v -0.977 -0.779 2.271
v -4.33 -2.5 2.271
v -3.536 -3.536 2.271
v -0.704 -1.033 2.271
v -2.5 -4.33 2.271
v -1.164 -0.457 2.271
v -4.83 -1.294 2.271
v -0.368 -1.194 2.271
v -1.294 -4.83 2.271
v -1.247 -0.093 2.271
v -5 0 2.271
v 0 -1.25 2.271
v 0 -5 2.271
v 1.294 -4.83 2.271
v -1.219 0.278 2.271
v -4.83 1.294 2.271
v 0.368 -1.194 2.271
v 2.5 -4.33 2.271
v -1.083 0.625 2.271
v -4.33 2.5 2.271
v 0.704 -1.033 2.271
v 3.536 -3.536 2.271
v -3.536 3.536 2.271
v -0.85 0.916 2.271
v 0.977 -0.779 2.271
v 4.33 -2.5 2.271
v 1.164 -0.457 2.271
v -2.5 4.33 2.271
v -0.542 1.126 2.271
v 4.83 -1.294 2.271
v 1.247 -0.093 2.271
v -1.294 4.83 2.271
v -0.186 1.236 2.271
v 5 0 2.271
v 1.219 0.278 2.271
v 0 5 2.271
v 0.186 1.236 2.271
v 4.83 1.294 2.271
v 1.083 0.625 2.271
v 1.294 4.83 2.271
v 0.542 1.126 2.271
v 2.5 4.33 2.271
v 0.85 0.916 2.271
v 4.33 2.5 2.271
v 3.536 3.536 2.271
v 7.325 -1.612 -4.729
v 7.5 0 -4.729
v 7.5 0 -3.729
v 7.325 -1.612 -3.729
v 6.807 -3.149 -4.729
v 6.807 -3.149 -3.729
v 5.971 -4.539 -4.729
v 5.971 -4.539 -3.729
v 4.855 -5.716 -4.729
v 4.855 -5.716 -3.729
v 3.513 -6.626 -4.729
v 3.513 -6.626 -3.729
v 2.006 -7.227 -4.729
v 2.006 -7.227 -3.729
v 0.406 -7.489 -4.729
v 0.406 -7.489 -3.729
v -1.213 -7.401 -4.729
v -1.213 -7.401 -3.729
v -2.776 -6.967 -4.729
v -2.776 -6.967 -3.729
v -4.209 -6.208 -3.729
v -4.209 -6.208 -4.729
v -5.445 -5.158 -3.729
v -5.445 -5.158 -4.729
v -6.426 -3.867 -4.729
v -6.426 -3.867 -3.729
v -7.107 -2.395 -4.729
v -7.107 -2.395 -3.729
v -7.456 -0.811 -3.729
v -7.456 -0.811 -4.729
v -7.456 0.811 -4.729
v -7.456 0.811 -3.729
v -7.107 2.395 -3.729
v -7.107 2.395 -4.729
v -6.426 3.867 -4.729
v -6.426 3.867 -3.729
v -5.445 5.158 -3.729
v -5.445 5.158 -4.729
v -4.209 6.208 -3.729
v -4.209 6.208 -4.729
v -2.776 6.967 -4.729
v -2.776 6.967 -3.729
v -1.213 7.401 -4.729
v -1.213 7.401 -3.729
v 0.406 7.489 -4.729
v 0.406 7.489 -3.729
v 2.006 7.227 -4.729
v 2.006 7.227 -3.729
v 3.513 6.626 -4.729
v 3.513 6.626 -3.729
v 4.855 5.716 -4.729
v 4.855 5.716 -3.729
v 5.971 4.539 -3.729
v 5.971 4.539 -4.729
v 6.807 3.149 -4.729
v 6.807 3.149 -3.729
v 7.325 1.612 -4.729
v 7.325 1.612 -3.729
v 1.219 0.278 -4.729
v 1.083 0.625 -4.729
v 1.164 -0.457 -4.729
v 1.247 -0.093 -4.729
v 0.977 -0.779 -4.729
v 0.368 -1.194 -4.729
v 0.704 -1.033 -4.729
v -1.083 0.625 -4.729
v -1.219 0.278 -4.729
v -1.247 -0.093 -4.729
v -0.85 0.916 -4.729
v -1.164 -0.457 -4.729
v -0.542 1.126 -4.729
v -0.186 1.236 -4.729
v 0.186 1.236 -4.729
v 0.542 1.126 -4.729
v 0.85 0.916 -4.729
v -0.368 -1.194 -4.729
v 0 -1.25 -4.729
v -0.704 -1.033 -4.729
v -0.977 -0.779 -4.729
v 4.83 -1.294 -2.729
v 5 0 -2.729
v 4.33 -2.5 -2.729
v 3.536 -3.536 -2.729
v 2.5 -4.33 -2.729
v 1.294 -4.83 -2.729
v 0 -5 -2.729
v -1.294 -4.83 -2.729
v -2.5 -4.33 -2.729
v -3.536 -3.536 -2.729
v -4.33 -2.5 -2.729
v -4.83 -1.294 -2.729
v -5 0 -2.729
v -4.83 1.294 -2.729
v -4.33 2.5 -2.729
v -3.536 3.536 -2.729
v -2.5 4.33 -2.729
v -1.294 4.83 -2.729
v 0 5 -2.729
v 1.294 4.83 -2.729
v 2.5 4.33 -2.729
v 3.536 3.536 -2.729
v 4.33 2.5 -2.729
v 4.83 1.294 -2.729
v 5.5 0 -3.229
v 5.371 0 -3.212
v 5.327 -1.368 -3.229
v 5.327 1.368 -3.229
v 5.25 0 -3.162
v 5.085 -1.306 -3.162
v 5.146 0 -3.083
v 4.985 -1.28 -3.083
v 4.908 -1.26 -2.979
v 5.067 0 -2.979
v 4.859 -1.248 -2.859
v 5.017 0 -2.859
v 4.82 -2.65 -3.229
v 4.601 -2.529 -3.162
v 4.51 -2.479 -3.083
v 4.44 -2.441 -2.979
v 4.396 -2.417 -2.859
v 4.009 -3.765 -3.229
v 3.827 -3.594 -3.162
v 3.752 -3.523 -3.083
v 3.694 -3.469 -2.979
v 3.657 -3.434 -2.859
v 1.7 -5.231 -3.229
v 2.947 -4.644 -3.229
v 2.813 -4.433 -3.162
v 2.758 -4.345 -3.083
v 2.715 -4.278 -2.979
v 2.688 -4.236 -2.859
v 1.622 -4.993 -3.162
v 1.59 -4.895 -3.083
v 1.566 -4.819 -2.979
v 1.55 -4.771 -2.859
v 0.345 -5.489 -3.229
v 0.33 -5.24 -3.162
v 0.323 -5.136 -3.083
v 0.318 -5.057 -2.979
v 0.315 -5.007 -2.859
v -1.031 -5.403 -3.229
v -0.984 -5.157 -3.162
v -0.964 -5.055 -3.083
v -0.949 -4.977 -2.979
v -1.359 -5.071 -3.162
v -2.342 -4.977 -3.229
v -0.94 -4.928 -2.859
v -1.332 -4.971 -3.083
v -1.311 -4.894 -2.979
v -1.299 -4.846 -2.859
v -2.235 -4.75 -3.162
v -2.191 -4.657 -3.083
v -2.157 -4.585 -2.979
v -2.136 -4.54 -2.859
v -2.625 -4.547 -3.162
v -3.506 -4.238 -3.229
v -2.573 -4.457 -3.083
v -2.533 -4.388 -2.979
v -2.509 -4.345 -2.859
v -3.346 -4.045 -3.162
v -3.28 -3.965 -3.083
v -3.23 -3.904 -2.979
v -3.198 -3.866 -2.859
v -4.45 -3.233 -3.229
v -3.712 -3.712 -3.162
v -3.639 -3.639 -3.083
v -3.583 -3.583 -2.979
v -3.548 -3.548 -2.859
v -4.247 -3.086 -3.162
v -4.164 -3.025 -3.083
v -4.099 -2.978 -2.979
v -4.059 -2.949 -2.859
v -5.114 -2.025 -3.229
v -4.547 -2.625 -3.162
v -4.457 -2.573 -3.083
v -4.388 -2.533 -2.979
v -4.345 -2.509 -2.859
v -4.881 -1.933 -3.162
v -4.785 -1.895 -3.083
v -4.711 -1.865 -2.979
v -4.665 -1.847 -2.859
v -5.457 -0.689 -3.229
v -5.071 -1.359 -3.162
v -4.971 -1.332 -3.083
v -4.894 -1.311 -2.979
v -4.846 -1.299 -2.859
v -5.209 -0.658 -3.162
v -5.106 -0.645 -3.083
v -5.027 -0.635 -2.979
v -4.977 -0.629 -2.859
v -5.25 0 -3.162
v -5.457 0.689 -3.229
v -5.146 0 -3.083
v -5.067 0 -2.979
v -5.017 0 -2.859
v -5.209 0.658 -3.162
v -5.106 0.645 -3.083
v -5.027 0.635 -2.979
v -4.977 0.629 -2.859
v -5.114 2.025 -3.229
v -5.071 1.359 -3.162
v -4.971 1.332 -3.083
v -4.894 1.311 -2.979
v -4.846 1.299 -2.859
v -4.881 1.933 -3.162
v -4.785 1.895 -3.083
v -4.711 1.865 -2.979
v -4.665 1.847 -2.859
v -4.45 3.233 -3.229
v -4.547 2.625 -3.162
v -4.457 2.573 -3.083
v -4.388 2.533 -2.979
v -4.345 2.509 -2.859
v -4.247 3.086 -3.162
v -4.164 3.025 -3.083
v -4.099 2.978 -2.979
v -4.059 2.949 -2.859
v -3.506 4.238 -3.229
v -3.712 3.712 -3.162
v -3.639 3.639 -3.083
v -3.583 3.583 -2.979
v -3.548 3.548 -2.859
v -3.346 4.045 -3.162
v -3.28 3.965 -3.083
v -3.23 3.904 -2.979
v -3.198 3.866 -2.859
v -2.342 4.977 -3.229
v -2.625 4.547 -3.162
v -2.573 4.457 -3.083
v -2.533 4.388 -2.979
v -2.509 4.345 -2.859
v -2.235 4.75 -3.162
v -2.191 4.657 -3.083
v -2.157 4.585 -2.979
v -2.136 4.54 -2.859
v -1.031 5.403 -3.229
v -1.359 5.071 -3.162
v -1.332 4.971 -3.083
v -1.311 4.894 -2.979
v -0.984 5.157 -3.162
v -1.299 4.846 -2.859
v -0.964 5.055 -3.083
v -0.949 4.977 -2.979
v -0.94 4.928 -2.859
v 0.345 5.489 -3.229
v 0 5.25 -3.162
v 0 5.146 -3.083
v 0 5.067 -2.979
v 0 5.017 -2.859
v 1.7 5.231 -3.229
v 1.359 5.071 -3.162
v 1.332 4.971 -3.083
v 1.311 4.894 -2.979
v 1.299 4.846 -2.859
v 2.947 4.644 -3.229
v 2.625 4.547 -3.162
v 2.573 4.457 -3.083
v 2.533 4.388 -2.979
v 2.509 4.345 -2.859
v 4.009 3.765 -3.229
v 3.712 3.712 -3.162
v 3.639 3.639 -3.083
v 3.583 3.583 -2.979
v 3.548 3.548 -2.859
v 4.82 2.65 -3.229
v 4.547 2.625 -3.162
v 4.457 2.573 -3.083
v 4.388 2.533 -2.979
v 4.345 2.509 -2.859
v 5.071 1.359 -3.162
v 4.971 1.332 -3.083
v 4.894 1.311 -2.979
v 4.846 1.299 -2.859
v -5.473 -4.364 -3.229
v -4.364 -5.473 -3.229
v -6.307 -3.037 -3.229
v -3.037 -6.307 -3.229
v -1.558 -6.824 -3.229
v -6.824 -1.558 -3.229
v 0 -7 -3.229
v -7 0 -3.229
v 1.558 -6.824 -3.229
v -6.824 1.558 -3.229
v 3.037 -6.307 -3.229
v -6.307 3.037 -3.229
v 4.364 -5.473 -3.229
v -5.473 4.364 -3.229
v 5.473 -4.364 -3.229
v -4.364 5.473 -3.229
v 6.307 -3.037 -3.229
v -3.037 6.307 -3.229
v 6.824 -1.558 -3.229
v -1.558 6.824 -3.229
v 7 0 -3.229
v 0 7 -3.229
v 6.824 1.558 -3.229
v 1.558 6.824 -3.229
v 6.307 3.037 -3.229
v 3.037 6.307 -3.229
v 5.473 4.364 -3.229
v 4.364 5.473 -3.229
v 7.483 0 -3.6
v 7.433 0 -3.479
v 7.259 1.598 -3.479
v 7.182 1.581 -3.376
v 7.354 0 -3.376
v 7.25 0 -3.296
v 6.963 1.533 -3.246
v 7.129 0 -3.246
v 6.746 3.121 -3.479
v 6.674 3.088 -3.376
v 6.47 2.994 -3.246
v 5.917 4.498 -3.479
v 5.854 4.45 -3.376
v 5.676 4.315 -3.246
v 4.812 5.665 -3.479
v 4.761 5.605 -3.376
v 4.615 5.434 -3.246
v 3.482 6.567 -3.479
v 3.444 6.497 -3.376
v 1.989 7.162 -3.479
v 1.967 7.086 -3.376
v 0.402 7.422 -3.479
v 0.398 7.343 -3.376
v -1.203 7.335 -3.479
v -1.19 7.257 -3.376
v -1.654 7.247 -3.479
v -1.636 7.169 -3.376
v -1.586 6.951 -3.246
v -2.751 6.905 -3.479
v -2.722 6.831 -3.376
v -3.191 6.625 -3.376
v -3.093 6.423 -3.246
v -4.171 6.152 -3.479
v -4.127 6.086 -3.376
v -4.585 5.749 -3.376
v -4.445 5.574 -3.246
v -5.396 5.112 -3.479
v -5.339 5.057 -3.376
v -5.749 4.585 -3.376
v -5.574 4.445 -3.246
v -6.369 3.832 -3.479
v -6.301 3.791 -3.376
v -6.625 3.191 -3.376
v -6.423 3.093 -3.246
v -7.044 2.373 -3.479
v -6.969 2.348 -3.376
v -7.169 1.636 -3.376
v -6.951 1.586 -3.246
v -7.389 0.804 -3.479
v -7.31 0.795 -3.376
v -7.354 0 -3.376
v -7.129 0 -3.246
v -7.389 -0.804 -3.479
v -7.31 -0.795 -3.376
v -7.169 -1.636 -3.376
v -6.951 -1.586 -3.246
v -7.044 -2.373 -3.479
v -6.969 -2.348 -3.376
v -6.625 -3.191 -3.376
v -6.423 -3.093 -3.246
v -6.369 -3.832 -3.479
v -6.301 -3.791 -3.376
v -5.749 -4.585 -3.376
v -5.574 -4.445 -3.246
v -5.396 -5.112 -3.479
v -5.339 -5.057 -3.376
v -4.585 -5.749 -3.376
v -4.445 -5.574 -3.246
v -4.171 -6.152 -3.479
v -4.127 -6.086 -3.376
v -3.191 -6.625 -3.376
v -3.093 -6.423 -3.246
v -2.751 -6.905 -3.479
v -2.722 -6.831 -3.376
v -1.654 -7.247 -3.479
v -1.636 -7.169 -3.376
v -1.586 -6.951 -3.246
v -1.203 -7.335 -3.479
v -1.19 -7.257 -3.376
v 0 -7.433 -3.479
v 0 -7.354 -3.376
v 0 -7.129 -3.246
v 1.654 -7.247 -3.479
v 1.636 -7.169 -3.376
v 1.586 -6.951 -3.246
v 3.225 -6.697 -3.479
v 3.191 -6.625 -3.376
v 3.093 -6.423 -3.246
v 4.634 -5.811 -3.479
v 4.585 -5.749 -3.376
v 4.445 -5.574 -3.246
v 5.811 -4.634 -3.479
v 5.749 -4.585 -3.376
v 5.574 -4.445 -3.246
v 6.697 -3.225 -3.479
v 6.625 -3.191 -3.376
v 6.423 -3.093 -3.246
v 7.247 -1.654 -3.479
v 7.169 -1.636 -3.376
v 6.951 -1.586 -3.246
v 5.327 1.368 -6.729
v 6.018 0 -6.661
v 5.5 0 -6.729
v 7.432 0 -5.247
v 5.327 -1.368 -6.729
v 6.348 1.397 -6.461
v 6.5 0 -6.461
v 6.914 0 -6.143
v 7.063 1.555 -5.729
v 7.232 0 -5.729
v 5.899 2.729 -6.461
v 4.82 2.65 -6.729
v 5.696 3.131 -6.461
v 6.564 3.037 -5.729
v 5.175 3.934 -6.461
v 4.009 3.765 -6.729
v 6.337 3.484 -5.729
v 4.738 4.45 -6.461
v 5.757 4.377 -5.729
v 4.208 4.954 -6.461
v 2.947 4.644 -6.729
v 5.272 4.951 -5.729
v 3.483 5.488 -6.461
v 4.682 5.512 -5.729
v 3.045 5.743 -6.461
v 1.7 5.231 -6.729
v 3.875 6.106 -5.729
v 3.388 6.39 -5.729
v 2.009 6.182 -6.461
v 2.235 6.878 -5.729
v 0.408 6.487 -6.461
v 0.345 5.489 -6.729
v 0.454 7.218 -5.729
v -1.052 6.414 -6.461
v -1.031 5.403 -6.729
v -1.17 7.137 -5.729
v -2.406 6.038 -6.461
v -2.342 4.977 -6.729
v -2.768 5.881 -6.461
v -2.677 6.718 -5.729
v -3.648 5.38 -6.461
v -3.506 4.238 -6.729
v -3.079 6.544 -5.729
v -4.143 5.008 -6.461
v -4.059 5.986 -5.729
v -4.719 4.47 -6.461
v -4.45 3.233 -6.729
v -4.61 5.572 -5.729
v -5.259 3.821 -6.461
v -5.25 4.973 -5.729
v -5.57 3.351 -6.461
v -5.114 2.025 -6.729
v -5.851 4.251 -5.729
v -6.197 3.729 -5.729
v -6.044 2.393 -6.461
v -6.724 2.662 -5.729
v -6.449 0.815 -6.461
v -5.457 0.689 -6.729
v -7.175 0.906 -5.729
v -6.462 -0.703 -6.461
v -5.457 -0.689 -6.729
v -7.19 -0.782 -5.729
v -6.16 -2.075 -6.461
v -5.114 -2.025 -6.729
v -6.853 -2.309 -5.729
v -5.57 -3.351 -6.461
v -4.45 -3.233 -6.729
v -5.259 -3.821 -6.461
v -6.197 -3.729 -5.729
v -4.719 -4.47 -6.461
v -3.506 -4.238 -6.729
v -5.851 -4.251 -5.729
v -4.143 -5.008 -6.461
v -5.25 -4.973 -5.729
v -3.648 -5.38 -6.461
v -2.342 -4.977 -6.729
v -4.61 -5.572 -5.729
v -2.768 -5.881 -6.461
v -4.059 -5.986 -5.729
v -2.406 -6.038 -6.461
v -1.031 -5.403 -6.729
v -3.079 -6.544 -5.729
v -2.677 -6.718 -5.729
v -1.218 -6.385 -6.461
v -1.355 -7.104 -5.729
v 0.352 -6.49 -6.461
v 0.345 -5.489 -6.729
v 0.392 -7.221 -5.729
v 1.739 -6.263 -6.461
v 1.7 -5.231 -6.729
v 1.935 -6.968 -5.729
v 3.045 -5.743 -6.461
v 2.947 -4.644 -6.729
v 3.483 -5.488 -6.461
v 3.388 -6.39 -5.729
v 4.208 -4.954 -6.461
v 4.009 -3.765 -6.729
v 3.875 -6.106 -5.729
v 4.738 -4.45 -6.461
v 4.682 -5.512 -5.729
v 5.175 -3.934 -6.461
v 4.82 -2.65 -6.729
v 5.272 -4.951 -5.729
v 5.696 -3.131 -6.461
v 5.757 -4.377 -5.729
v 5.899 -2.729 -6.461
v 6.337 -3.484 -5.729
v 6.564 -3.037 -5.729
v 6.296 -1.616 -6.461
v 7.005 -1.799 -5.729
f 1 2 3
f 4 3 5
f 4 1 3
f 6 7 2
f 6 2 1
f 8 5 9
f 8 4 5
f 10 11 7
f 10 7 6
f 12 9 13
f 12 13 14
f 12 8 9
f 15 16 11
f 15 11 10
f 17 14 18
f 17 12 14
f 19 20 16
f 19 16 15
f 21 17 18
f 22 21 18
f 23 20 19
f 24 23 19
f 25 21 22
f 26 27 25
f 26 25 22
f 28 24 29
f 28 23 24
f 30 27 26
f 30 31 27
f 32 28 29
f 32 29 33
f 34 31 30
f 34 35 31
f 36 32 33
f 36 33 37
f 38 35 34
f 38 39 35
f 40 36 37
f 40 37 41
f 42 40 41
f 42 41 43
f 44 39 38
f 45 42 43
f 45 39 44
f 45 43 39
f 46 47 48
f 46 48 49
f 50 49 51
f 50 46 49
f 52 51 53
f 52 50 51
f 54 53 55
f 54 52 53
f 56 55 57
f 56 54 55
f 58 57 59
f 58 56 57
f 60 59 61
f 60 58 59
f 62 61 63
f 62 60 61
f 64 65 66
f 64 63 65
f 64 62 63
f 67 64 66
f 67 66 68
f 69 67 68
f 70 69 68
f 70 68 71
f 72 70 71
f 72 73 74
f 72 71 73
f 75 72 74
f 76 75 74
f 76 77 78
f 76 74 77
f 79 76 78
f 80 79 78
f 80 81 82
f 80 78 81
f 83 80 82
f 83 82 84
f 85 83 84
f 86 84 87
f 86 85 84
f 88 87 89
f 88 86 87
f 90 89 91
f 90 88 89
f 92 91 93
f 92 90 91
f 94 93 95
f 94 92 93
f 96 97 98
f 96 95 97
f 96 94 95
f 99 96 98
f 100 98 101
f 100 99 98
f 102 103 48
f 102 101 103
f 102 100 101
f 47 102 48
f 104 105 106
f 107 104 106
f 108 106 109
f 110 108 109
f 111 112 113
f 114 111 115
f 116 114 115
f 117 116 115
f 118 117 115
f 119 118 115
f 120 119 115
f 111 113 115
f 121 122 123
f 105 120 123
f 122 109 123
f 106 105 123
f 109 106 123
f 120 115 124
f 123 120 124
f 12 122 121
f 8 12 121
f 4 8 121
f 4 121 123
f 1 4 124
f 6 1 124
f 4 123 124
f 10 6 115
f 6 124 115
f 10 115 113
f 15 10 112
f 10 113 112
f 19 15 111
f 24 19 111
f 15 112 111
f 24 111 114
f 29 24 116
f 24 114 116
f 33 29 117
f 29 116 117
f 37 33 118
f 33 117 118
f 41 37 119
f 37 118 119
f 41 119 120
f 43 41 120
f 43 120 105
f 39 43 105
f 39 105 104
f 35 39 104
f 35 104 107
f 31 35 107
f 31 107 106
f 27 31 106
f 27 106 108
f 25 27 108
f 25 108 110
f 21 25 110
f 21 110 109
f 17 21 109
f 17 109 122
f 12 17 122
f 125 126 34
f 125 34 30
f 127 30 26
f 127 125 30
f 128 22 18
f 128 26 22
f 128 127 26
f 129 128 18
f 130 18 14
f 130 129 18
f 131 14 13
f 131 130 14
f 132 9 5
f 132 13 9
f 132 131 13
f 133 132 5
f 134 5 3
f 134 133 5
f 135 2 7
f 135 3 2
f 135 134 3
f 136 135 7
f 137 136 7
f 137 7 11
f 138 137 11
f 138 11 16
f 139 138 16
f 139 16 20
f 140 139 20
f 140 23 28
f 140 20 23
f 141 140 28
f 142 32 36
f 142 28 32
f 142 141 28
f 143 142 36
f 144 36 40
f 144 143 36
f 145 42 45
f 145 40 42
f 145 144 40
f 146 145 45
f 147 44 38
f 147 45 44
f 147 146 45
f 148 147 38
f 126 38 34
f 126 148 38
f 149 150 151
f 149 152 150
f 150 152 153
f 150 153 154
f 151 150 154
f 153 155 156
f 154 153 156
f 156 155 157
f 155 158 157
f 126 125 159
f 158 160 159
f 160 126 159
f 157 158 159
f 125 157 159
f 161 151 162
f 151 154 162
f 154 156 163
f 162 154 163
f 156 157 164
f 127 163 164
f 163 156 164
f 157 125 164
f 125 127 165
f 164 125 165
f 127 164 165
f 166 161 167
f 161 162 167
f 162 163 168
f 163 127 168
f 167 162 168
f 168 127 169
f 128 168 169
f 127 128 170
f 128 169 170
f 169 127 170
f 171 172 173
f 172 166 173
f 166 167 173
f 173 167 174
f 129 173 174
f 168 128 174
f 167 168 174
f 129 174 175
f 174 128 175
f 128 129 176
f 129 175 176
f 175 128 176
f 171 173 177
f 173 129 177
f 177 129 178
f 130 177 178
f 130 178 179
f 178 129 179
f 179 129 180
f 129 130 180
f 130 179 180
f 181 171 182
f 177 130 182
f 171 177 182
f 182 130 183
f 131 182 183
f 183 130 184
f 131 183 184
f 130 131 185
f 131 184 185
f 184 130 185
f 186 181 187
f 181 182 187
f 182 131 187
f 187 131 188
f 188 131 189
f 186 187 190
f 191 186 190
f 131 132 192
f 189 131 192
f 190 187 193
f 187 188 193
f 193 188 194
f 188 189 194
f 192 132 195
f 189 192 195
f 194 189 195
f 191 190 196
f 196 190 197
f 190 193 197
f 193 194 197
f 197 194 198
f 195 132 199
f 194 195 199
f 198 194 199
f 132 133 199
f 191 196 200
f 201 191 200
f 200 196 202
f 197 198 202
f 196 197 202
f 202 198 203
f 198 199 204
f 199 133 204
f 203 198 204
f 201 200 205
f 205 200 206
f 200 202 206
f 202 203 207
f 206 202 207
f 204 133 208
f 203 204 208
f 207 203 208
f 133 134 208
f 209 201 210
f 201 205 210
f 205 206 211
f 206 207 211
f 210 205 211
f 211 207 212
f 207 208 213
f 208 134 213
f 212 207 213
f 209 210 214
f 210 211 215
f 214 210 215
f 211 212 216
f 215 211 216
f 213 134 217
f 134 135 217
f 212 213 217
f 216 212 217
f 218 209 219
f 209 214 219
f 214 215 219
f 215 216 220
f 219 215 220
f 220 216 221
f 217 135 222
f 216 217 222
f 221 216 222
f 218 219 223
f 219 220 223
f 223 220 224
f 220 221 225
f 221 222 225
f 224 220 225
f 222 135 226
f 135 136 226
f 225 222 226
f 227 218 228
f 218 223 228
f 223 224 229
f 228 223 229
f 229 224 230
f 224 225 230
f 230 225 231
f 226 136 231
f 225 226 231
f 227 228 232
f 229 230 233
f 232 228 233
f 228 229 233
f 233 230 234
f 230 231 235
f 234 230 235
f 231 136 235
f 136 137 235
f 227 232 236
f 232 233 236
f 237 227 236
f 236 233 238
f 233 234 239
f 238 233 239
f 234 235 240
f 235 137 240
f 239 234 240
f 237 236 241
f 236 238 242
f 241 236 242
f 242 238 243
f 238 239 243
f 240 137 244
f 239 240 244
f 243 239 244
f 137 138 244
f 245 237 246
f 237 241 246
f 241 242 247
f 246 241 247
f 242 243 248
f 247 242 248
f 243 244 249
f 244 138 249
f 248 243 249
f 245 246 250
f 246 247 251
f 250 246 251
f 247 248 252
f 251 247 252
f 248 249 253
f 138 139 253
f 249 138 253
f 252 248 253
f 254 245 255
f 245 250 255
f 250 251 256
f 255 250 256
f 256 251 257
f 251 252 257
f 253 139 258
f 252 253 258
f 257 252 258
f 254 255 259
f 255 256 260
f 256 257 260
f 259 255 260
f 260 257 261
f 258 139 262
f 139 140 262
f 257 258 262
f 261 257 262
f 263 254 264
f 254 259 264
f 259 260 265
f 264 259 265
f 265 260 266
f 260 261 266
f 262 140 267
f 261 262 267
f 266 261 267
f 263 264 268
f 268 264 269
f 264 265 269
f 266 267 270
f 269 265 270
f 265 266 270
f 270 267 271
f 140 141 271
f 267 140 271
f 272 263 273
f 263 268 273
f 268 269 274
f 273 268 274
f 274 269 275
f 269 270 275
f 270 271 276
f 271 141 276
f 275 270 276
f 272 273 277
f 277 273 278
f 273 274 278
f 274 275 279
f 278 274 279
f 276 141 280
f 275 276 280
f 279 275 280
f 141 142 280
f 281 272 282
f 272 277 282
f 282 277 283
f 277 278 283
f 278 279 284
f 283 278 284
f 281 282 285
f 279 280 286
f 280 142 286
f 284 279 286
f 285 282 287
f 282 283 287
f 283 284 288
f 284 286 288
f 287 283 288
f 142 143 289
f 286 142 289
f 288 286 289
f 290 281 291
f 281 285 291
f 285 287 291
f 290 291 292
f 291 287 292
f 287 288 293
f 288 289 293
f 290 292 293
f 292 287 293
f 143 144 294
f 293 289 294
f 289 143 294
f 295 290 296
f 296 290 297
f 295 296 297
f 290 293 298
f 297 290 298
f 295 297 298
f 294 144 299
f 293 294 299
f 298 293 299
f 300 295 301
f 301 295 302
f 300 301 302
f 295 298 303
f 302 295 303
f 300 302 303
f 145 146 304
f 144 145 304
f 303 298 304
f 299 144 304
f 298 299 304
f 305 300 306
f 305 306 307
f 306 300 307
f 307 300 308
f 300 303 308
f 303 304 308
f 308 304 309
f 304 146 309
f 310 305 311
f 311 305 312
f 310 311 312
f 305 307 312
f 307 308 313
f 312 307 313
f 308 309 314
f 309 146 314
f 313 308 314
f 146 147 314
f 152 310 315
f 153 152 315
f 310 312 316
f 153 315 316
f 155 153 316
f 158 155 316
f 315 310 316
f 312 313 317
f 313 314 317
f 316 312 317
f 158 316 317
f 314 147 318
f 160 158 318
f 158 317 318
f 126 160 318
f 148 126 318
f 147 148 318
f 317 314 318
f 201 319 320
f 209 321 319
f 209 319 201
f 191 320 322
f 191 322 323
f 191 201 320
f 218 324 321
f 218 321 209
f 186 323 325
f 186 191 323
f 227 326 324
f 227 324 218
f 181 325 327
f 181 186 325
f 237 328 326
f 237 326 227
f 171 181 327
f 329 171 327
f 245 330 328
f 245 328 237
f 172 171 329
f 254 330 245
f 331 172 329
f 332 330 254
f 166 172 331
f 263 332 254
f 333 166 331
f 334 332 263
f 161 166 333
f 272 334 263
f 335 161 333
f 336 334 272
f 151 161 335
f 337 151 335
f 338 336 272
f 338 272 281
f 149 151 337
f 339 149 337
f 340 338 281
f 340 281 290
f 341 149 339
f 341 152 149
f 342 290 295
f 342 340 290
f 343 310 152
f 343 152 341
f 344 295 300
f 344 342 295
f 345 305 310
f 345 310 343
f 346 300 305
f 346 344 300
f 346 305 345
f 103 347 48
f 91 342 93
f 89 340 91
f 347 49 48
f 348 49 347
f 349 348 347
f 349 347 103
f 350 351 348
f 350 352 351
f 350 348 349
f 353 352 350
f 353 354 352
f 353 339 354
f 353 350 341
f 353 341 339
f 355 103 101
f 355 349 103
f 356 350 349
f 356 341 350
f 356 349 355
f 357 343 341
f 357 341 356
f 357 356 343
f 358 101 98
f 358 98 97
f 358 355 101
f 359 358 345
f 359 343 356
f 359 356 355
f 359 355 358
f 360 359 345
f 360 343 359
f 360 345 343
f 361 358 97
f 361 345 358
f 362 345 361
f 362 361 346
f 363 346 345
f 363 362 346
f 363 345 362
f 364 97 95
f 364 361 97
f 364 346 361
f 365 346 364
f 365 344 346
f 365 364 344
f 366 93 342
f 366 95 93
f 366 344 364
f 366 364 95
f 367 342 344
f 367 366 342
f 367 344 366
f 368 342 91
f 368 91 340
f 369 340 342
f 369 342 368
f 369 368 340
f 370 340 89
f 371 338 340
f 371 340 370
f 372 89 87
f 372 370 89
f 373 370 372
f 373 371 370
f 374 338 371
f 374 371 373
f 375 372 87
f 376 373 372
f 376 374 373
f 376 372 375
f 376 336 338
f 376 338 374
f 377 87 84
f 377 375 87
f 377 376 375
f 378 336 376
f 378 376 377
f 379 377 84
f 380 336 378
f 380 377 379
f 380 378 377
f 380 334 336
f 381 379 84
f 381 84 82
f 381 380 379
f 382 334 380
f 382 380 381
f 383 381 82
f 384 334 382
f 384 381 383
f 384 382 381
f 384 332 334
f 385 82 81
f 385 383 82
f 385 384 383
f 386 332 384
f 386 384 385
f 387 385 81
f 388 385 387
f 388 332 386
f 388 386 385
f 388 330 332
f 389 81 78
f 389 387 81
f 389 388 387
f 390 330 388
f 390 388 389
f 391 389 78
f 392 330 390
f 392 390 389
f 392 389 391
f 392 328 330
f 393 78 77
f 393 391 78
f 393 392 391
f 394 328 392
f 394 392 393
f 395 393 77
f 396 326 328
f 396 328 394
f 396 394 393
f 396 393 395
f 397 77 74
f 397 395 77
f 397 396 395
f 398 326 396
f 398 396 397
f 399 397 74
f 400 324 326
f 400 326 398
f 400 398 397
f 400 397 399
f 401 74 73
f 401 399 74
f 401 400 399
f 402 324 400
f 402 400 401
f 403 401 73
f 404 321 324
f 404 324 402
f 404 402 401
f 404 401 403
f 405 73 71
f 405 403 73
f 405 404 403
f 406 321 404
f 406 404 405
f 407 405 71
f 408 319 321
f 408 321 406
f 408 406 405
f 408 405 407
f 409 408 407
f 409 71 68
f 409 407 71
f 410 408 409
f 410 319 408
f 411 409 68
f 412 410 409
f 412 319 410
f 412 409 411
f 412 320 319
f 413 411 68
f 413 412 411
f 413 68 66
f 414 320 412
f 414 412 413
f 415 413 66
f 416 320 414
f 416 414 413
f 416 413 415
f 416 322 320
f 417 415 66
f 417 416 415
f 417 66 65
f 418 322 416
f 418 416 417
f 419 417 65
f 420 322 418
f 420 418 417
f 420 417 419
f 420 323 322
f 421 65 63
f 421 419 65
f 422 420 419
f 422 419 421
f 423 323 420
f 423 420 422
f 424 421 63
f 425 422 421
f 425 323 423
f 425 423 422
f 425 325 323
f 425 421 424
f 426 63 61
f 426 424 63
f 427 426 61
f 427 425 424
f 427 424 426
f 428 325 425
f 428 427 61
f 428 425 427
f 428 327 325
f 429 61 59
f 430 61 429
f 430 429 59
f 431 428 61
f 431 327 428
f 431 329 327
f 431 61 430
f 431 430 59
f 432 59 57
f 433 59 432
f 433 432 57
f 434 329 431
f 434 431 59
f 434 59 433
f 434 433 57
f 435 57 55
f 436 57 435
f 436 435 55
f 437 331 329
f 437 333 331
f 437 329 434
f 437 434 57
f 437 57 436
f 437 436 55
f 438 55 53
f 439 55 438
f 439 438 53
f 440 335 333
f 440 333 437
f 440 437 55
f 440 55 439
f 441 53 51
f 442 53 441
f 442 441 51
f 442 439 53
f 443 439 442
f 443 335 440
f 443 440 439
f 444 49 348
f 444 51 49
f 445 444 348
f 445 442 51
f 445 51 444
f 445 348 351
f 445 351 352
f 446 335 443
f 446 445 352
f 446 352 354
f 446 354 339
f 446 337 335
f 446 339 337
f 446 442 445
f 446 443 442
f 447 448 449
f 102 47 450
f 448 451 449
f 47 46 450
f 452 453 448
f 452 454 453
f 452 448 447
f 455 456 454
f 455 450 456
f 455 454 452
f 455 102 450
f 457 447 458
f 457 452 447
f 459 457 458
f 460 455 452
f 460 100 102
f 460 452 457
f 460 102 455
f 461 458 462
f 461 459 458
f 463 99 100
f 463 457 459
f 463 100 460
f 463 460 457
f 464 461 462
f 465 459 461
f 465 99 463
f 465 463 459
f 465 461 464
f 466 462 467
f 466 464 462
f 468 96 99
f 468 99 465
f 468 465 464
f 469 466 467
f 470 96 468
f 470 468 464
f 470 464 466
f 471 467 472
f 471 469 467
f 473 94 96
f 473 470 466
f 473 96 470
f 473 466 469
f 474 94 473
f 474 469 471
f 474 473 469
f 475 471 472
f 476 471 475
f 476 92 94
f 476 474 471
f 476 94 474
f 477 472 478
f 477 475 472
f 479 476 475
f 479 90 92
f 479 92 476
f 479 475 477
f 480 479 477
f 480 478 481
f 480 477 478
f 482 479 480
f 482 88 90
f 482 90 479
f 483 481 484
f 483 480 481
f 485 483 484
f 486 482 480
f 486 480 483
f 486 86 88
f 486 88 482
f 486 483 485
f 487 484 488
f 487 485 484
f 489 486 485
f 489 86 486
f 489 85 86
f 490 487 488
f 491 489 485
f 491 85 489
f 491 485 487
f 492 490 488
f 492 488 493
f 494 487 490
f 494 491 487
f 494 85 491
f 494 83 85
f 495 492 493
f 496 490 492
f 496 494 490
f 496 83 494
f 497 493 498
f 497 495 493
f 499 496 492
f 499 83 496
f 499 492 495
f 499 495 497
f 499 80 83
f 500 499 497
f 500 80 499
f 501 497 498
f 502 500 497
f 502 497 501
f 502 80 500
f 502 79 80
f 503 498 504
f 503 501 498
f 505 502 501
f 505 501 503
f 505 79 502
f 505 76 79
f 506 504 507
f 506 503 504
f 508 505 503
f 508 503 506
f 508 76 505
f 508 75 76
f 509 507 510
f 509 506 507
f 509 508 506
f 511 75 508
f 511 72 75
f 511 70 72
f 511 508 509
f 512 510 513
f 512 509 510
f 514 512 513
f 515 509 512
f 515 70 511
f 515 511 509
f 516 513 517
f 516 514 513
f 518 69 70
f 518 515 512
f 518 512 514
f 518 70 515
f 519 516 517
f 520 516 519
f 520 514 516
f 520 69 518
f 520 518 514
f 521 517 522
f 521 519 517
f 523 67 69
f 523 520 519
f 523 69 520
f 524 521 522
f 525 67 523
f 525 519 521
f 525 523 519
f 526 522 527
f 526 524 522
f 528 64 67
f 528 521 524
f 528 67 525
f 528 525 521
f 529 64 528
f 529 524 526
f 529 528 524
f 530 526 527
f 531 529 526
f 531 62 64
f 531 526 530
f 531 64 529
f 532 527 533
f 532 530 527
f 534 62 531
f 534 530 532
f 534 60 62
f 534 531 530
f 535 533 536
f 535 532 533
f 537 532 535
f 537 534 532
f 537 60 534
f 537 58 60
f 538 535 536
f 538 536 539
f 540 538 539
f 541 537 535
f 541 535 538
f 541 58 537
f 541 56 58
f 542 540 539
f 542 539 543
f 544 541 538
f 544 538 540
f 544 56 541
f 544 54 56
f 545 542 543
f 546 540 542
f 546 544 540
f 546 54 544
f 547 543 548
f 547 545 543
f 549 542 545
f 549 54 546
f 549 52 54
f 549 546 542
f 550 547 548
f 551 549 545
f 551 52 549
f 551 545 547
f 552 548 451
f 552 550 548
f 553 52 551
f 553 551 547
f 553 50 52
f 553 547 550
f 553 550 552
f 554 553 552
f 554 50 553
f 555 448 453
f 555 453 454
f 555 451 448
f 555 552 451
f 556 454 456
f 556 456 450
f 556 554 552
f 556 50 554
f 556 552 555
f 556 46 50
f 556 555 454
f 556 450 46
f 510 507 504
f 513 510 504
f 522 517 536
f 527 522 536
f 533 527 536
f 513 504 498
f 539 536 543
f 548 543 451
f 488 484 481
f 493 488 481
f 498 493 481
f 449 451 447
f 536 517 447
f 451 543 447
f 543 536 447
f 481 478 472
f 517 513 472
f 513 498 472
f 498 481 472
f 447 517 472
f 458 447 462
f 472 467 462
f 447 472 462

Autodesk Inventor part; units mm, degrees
ref_plane "YZ Plane" through (0, 0, 0) normal (1, 0, 0) x (0, 1, 0)
ref_plane "XZ Plane" through (0, 0, 0) normal (0, 1, 0) x (-1, 0, 0)
ref_plane "XY Plane" through (0, 0, 0) normal (0, 0, 1) x (1, 0, 0)
sketch "Esquisse1" plane through (0, 0, 0) normal (0, 1, 0) x (-1, 0, 0)
  line L0 (0, -6.7291) -> (0, 2.2709)
  line L1 (0, 2.2709) -> (-5, 2.2709)
  line L2 (-5, 2.2709) -> (-5, -3.2291)
  line L3 (-5, -3.2291) -> (-7.5, -3.2291)
  line L4 (0, -6.7291) -> (-7.5, -6.7291)
  line L5 (-7.5, -3.2291) -> (-7.5, -6.7291)
  point P0 (0, 0)
  dimension "d0" = 9
  dimension "d1" = 5
  dimension "d2" = 5.5
  dimension "d3" = 7.5
revolve "Révolution1" add sketch "Esquisse1" angle 360 about axis through (0, 0, -6.7291) along (0, 0, 1)
fillet "Congé1" radius 2 1 edges at (-7.5, 0, -6.7291)
fillet "Congé2" radius 0.5 1 edges at (-7.5, 0, -3.2291)
fillet "Congé3" radius 0.5 1 edges at (-5, 0, -3.2291)
hole "Perçage1" at (0, 0, 2.2709) direction (0, 0, -1) diameter 2.5 depth 7
properties part number "pied" material "Plastique ABS"
